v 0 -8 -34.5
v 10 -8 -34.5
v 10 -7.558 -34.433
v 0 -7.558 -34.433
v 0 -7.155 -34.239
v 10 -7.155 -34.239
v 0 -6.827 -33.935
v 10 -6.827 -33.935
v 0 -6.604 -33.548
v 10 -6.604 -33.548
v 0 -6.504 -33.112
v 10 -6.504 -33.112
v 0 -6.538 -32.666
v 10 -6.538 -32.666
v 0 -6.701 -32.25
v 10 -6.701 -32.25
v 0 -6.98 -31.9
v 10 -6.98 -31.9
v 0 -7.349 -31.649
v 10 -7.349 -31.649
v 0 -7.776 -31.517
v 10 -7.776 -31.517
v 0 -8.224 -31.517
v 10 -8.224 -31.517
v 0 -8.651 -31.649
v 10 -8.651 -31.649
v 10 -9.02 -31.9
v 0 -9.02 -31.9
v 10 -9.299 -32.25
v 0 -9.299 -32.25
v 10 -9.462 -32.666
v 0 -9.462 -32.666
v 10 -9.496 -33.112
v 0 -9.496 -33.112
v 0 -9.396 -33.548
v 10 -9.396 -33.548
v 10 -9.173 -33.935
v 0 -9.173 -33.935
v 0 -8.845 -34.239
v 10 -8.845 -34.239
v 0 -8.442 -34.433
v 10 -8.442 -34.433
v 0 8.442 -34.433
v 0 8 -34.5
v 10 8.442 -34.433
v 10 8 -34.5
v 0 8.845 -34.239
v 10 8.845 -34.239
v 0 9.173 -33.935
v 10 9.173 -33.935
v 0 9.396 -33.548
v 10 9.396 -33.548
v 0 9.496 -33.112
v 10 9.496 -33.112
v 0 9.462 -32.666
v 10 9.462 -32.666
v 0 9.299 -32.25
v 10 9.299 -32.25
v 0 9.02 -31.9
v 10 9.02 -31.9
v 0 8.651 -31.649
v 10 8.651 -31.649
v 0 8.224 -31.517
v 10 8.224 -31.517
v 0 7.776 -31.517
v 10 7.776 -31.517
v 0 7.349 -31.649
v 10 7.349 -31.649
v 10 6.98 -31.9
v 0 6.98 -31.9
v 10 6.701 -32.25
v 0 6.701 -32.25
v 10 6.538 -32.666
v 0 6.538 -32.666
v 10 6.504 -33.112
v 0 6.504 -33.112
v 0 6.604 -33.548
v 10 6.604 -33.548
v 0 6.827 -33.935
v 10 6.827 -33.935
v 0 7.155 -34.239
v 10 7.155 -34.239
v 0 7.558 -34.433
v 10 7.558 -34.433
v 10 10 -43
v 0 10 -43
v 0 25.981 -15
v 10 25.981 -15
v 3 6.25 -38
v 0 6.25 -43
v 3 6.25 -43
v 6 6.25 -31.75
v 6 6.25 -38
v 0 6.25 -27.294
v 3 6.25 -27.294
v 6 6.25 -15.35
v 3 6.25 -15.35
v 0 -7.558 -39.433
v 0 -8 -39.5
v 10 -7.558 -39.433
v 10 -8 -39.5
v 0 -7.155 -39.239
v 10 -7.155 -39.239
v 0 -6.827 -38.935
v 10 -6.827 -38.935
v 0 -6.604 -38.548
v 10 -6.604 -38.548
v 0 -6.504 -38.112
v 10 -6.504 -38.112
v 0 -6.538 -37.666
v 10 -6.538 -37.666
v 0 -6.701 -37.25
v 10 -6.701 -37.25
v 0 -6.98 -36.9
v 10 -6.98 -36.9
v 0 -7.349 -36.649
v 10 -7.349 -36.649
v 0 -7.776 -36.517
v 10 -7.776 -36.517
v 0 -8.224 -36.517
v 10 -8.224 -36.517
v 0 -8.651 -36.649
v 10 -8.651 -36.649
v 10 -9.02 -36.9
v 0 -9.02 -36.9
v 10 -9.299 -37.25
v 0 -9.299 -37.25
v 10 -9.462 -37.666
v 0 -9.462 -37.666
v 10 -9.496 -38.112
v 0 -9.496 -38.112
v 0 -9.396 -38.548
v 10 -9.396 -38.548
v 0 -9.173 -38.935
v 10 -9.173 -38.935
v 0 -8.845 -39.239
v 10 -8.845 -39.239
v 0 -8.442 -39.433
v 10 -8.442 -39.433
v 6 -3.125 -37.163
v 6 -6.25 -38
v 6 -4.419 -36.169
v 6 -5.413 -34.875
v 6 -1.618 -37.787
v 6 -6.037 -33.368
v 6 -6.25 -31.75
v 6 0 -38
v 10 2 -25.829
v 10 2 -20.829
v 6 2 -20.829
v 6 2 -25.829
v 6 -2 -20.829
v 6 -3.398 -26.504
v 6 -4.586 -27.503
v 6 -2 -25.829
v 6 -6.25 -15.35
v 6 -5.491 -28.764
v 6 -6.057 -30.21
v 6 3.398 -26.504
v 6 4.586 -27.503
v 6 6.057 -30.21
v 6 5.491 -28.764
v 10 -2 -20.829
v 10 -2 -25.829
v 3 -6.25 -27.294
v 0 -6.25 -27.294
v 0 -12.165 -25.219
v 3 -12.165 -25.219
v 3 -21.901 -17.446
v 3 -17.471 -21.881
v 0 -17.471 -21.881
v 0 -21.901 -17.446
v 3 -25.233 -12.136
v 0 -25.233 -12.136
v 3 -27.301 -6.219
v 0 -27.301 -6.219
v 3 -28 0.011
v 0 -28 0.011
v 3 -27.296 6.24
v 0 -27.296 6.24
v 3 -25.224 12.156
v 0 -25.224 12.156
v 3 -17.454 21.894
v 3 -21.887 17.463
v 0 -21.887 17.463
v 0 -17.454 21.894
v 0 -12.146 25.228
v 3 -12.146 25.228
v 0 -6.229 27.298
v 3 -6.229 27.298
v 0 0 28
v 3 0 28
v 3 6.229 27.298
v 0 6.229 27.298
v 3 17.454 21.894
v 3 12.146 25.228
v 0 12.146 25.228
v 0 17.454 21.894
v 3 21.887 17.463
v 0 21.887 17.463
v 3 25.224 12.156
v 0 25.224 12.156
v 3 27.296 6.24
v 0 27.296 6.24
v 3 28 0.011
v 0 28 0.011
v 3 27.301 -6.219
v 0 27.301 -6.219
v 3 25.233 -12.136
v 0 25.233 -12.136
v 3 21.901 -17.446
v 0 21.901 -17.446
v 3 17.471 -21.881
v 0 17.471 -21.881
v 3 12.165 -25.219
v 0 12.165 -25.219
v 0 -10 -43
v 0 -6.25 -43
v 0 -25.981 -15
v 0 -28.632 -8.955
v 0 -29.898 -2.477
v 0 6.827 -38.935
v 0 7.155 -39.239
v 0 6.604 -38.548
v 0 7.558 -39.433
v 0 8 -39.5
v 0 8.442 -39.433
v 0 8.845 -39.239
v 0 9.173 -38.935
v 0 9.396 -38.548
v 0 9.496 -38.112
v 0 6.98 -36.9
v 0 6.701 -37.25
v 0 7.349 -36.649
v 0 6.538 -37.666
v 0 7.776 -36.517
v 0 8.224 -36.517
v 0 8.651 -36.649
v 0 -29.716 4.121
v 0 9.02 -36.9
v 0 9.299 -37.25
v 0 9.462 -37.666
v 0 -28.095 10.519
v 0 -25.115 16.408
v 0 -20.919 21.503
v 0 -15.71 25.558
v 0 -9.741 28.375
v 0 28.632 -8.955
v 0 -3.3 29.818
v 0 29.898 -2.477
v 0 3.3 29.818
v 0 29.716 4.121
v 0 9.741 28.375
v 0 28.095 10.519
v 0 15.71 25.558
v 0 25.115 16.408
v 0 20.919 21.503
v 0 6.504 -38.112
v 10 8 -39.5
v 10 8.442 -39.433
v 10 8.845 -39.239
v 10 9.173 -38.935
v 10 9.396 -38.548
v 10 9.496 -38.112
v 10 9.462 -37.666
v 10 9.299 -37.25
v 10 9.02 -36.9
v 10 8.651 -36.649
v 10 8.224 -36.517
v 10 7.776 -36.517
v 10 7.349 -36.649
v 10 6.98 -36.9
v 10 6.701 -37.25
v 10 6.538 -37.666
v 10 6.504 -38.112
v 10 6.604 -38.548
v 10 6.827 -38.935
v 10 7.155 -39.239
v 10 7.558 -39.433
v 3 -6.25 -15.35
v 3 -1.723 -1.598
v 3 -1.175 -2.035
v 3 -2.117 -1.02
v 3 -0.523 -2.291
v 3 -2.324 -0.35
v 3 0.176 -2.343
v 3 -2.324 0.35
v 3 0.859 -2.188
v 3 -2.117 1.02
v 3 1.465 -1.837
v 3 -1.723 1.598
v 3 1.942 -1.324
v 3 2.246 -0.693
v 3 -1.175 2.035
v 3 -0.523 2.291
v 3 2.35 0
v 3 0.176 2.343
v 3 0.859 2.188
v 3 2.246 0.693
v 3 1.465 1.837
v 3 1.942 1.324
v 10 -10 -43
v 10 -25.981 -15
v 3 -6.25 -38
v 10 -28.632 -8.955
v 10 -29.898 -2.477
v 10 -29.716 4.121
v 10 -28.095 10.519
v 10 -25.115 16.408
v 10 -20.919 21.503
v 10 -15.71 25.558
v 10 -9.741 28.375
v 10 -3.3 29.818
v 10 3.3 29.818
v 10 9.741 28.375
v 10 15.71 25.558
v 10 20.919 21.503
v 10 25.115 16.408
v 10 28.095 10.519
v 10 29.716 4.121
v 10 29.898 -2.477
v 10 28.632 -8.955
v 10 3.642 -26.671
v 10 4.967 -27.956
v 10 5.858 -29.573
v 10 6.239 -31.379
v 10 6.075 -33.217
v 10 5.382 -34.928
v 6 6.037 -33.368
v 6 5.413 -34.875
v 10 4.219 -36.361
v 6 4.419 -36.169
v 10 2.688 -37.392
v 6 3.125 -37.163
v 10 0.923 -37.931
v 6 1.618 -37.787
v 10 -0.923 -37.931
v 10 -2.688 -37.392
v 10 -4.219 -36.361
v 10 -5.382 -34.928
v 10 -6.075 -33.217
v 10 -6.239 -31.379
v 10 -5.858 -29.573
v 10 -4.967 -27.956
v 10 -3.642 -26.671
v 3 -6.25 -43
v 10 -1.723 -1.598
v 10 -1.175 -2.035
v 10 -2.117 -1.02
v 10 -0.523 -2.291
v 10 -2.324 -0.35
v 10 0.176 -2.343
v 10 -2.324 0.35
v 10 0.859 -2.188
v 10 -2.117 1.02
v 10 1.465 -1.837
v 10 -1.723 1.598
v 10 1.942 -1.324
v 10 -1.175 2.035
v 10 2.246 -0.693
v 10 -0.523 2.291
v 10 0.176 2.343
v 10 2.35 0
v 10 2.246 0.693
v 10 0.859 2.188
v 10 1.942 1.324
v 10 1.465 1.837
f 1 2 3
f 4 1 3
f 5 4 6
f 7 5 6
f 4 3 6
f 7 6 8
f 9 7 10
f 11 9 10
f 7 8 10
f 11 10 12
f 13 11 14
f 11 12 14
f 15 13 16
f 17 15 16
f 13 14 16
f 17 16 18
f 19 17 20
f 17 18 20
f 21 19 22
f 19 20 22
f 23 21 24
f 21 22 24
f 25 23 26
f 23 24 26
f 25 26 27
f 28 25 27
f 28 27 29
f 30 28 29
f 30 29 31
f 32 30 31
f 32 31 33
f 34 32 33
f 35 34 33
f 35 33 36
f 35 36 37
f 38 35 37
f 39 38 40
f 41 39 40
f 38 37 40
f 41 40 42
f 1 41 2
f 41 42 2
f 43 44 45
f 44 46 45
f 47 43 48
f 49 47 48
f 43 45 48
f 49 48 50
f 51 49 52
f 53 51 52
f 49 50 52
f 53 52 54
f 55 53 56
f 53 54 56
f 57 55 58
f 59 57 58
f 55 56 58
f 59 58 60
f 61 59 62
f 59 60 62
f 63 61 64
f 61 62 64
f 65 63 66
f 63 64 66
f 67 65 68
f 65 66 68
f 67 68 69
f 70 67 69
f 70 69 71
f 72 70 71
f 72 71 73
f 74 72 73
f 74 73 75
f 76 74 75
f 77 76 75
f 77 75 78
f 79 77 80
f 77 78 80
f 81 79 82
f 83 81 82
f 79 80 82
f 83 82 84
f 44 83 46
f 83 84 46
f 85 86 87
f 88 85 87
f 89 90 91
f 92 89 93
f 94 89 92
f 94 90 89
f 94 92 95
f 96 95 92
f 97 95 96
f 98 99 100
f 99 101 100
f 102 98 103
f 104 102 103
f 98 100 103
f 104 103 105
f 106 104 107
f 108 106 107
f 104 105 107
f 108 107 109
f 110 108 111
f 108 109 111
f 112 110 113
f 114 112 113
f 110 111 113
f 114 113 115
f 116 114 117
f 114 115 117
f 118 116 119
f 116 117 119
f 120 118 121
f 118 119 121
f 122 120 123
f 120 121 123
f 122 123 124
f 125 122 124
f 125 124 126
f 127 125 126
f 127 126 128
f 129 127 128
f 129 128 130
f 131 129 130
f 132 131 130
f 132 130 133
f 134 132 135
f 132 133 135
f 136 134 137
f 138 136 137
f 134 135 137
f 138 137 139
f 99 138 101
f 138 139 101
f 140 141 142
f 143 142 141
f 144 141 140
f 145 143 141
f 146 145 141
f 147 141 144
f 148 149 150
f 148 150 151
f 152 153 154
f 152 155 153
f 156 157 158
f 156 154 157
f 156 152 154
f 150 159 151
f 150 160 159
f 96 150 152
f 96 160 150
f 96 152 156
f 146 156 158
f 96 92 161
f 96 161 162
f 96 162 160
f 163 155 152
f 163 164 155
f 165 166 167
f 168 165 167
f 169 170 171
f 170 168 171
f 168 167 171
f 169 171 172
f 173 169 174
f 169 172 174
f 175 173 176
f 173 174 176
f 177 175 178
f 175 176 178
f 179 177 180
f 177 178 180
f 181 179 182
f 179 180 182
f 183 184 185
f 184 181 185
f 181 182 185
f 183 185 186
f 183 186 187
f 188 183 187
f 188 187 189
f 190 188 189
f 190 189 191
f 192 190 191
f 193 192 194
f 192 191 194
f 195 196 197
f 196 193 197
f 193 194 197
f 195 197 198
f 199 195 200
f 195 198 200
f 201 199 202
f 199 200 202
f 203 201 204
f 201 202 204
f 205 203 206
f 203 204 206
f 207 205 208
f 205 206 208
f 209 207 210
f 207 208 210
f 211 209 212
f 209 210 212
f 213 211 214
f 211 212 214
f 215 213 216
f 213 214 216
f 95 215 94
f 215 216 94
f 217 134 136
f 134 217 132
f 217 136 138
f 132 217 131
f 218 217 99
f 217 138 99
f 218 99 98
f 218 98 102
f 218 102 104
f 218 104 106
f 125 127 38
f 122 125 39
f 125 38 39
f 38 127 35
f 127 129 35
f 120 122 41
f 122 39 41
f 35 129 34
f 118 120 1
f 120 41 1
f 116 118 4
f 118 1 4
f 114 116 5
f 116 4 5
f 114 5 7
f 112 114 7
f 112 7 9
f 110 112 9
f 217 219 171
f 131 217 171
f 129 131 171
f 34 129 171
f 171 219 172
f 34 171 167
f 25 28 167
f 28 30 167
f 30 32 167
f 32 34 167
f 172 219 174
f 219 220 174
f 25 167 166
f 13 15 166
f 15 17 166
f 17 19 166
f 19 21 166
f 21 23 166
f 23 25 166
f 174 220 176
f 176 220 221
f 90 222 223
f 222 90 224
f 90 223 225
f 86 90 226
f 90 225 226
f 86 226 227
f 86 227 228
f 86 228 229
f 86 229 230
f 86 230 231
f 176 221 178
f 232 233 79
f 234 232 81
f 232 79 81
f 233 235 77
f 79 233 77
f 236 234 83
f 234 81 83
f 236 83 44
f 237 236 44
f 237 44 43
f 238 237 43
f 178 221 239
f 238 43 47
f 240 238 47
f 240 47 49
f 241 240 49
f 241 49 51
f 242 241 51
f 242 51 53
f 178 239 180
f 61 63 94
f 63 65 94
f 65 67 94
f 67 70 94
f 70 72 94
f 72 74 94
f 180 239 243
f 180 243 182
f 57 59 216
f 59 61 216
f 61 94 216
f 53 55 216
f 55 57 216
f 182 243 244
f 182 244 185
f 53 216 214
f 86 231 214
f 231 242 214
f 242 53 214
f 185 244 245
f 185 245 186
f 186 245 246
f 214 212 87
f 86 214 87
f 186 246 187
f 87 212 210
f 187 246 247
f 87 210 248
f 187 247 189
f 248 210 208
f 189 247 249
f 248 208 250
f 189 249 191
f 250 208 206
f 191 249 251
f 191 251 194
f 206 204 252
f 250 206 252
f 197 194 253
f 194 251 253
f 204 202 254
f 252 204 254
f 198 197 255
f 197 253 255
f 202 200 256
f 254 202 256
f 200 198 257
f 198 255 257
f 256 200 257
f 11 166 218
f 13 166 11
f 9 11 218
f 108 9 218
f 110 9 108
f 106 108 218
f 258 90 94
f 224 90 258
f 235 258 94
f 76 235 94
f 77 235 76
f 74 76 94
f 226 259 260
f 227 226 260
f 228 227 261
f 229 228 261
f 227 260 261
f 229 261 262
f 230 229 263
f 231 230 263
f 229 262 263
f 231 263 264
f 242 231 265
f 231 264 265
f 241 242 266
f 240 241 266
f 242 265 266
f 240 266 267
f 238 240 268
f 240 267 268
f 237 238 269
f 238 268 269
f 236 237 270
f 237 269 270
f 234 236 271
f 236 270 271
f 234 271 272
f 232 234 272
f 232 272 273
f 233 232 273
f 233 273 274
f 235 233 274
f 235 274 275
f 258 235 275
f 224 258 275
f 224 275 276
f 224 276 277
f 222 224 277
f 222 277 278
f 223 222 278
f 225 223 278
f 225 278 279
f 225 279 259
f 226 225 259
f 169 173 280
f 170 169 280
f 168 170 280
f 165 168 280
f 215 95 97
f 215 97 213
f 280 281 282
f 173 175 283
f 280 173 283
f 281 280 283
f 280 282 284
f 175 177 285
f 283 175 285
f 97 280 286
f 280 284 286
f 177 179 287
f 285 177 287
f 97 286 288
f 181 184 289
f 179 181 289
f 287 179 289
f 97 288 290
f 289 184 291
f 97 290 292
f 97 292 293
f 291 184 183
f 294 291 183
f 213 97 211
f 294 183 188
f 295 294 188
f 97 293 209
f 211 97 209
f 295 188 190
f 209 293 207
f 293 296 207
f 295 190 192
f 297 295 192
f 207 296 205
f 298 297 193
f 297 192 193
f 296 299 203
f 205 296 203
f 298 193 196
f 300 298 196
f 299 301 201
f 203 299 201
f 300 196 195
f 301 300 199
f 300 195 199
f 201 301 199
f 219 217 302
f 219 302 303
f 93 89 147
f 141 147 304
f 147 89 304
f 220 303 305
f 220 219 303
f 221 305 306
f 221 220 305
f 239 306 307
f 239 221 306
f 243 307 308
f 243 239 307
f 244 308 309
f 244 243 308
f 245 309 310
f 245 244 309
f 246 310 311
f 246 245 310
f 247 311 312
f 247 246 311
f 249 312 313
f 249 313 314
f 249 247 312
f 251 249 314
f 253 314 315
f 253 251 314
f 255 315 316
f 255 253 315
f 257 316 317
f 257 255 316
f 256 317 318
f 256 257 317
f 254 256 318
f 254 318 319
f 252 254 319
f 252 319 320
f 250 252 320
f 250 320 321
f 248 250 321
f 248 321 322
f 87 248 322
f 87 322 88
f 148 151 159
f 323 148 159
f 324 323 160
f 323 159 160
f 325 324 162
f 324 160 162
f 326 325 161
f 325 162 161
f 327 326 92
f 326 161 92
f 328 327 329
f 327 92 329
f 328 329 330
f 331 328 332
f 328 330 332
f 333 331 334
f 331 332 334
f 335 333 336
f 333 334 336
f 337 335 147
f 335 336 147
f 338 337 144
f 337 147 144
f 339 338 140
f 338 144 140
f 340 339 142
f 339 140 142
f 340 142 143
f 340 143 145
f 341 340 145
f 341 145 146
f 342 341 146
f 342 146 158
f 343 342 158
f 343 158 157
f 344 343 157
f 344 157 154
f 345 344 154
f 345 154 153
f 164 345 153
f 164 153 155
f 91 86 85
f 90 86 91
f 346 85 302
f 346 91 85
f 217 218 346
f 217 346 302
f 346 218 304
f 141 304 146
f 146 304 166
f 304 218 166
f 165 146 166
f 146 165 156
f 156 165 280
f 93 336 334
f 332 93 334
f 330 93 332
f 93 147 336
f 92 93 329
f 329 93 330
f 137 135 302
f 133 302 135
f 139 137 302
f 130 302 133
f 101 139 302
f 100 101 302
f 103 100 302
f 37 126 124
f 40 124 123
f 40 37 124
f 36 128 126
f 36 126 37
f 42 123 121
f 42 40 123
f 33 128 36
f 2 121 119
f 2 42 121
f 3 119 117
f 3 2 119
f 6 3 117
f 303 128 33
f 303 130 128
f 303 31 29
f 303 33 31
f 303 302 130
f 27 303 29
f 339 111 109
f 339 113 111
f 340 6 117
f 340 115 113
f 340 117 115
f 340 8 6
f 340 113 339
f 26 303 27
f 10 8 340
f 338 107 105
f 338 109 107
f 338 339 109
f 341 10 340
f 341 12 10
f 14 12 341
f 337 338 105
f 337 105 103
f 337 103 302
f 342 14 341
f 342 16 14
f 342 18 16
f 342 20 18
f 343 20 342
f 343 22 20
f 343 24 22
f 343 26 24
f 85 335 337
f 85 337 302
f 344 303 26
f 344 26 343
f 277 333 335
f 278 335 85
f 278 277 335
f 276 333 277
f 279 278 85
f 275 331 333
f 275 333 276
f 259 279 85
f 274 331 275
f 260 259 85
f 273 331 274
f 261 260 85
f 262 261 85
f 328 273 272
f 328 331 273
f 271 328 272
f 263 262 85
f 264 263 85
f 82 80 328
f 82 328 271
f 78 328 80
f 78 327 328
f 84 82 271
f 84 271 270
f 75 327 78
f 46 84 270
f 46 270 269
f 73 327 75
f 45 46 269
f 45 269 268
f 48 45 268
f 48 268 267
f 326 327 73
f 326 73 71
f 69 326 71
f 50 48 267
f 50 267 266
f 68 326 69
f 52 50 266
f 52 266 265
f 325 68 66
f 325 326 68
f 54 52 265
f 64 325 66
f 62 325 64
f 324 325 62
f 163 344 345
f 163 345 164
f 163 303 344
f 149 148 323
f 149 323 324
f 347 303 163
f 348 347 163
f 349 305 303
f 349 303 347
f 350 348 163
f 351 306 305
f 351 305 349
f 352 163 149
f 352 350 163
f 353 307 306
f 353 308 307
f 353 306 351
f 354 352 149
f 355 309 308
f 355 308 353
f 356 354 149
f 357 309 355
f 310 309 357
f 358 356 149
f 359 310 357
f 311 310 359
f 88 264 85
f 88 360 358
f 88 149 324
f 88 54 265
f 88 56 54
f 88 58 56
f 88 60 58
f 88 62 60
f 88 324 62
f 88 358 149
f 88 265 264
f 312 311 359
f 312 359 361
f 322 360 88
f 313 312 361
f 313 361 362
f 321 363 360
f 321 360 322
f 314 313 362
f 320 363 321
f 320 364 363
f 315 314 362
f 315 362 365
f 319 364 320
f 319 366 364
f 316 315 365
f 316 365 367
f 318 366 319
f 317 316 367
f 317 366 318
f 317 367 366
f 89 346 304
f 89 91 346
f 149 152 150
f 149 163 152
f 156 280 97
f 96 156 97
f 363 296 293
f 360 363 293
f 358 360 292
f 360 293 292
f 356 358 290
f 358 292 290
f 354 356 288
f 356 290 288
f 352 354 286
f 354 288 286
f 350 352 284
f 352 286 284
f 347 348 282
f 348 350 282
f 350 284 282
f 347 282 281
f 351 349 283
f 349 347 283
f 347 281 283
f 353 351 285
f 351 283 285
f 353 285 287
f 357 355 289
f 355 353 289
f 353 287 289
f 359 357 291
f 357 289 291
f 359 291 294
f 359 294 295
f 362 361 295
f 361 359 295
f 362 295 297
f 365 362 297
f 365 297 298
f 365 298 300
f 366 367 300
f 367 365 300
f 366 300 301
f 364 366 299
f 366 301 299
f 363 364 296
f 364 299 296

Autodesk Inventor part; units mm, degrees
ref_plane "YZ Plane" through (0, 0, 0) normal (1, 0, 0) x (0, 1, 0)
ref_plane "XZ Plane" through (0, 0, 0) normal (0, 1, 0) x (-1, 0, 0)
ref_plane "XY Plane" through (0, 0, 0) normal (0, 0, 1) x (1, 0, 0)
sketch "スケッチ1" plane through (0, 0, 0) normal (1, 0, 0) x (0, 1, 0)
  circle A0 centre (0, 0) radius 30
  line L0 (10, -28.2843) -> (10, -43)
  line L1 (10, -43) -> (-10, -43)
  line L2 (-10, -43) -> (-10, -28.2843)
  line L3 (10, -43) -> (25.9808, -15)
  line L4 (-10, -43) -> (-25.9808, -15)
  circle A1 centre (0, 0) radius 2.35
  circle A2 centre (0, 0) radius 28
  point P0 (0, -30)
  point P1 (0, -28.05)
  point P2 (0, -26.4333)
  dimension "d2" = 20
  dimension "d10" = 4.7
  dimension "d34" = 13
  dimension "d39" = 2
extrude "押し出し8" add sketch "スケッチ1" along normal blind 10 contours A0 | A0 L2 L4 | L3 L0 A0 | A0 L0 L1 L2 | A2
extrude "押し出し9" cut sketch "スケッチ1" along normal blind 3 contours A2
sketch "スケッチ3" plane through (0, 0, 0) normal (-1, 0, 0) x (0, 0, 1)
  line L0 (-15.35, 6.25) -> (-38, 6.25)
  line L1 (-38, 6.25) -> (-38, -6.25)
  line L2 (-38, -6.25) -> (-15.35, -6.25)
  line L3 (-15.35, -6.25) -> (-15.35, 6.25)
  line L4 (-15.35, 6.25) -> (-38, -6.25) construction
  line L5 (-38, 6.25) -> (-15.35, -6.25) construction
  line L6 (-15.35, -6.25) -> (-10.35, -6.25)
  line L7 (-10.35, -6.25) -> (-10.35, 6.25)
  line L8 (-10.35, 6.25) -> (-15.35, 6.25)
  line L9 (-15.35, 6.25) -> (-15.35, -6.25)
  line L10 (-38, -6.25) -> (-43, -6.25)
  line L11 (-43, -6.25) -> (-43, 6.25)
  line L12 (-43, 6.25) -> (-38, 6.25)
  line L13 (-38, 6.25) -> (-38, -6.25)
  circle A0 centre (-31.75, 0) radius 6.25
  circle A1 centre (-31.75, 0) radius 2.4
  line L14 (-43, -10) -> (-43, 10) projected
  point P0 (0, 0)
  point P1 (-26.675, 0)
  dimension "d42" = 22.65
  dimension "d43" = 12.5
  dimension "d44" = 5
  dimension "d45" = 5
  dimension "d46" = 12.5
  dimension "d47" = 0
  dimension "d48" = 4.8
  dimension "d49" = 0
  dimension "d50" = 0
extrude "押し出し10" cut sketch "スケッチ3" against normal blind 10 contours A0
extrude "押し出し11" cut sketch "スケッチ3" against normal blind 10 contours A1
extrude "押し出し12" cut sketch "スケッチ3" against normal blind 6 contours L3 L2 A0 L0 | A0 L1 L0 | A0 L2 L1
extrude "押し出し13" cut sketch "スケッチ3" against normal blind 3 contours L1 L10 L11 L12
sketch "スケッチ5" plane through (10, 0, 0) normal (1, 0, 0) x (0, 0, -1)
  arc A0 (31.75, 6.25) -> (31.75, -6.25) centre (31.75, 0) ccw projected
  line L0 (25.8286, -2) -> (20.8286, -2)
  line L1 (20.8286, -2) -> (20.8286, 2)
  line L2 (20.8286, 2) -> (25.8286, 2)
  line L3 (25.8286, 2) -> (25.8286, -2)
  point P0 (0, 0)
  dimension "d63" = 4
  dimension "d64" = 2
  dimension "d65" = 5
extrude "押し出し14" cut sketch "スケッチ5" against normal blind 10
sketch "スケッチ6" plane through (10, 0, 0) normal (1, 0, 0) x (0, 0, -1)
  circle A0 centre (38, -8) radius 1.5
  circle A1 centre (38, 8) radius 1.5
  line L0 (43, -10) -> (43, 10) projected
  circle A2 centre (33, -8) radius 1.5
  circle A3 centre (33, 8) radius 1.5
  point P0 (0, 0)
  dimension "d68" = 5
  dimension "d69" = 5
  dimension "d74" = 3
  dimension "d76" = 16
  dimension "d77" = 2
  dimension "d78" = 2
  dimension "d81" = 3
  dimension "d82" = 5
  dimension "d83" = 5
  dimension "d84" = 3
extrude "押し出し15" cut sketch "スケッチ6" against normal blind 100 contours A0 | A1
extrude "押し出し16" cut sketch "スケッチ6" against normal blind 100 contours A2 | A3
properties part number "BasePart"
